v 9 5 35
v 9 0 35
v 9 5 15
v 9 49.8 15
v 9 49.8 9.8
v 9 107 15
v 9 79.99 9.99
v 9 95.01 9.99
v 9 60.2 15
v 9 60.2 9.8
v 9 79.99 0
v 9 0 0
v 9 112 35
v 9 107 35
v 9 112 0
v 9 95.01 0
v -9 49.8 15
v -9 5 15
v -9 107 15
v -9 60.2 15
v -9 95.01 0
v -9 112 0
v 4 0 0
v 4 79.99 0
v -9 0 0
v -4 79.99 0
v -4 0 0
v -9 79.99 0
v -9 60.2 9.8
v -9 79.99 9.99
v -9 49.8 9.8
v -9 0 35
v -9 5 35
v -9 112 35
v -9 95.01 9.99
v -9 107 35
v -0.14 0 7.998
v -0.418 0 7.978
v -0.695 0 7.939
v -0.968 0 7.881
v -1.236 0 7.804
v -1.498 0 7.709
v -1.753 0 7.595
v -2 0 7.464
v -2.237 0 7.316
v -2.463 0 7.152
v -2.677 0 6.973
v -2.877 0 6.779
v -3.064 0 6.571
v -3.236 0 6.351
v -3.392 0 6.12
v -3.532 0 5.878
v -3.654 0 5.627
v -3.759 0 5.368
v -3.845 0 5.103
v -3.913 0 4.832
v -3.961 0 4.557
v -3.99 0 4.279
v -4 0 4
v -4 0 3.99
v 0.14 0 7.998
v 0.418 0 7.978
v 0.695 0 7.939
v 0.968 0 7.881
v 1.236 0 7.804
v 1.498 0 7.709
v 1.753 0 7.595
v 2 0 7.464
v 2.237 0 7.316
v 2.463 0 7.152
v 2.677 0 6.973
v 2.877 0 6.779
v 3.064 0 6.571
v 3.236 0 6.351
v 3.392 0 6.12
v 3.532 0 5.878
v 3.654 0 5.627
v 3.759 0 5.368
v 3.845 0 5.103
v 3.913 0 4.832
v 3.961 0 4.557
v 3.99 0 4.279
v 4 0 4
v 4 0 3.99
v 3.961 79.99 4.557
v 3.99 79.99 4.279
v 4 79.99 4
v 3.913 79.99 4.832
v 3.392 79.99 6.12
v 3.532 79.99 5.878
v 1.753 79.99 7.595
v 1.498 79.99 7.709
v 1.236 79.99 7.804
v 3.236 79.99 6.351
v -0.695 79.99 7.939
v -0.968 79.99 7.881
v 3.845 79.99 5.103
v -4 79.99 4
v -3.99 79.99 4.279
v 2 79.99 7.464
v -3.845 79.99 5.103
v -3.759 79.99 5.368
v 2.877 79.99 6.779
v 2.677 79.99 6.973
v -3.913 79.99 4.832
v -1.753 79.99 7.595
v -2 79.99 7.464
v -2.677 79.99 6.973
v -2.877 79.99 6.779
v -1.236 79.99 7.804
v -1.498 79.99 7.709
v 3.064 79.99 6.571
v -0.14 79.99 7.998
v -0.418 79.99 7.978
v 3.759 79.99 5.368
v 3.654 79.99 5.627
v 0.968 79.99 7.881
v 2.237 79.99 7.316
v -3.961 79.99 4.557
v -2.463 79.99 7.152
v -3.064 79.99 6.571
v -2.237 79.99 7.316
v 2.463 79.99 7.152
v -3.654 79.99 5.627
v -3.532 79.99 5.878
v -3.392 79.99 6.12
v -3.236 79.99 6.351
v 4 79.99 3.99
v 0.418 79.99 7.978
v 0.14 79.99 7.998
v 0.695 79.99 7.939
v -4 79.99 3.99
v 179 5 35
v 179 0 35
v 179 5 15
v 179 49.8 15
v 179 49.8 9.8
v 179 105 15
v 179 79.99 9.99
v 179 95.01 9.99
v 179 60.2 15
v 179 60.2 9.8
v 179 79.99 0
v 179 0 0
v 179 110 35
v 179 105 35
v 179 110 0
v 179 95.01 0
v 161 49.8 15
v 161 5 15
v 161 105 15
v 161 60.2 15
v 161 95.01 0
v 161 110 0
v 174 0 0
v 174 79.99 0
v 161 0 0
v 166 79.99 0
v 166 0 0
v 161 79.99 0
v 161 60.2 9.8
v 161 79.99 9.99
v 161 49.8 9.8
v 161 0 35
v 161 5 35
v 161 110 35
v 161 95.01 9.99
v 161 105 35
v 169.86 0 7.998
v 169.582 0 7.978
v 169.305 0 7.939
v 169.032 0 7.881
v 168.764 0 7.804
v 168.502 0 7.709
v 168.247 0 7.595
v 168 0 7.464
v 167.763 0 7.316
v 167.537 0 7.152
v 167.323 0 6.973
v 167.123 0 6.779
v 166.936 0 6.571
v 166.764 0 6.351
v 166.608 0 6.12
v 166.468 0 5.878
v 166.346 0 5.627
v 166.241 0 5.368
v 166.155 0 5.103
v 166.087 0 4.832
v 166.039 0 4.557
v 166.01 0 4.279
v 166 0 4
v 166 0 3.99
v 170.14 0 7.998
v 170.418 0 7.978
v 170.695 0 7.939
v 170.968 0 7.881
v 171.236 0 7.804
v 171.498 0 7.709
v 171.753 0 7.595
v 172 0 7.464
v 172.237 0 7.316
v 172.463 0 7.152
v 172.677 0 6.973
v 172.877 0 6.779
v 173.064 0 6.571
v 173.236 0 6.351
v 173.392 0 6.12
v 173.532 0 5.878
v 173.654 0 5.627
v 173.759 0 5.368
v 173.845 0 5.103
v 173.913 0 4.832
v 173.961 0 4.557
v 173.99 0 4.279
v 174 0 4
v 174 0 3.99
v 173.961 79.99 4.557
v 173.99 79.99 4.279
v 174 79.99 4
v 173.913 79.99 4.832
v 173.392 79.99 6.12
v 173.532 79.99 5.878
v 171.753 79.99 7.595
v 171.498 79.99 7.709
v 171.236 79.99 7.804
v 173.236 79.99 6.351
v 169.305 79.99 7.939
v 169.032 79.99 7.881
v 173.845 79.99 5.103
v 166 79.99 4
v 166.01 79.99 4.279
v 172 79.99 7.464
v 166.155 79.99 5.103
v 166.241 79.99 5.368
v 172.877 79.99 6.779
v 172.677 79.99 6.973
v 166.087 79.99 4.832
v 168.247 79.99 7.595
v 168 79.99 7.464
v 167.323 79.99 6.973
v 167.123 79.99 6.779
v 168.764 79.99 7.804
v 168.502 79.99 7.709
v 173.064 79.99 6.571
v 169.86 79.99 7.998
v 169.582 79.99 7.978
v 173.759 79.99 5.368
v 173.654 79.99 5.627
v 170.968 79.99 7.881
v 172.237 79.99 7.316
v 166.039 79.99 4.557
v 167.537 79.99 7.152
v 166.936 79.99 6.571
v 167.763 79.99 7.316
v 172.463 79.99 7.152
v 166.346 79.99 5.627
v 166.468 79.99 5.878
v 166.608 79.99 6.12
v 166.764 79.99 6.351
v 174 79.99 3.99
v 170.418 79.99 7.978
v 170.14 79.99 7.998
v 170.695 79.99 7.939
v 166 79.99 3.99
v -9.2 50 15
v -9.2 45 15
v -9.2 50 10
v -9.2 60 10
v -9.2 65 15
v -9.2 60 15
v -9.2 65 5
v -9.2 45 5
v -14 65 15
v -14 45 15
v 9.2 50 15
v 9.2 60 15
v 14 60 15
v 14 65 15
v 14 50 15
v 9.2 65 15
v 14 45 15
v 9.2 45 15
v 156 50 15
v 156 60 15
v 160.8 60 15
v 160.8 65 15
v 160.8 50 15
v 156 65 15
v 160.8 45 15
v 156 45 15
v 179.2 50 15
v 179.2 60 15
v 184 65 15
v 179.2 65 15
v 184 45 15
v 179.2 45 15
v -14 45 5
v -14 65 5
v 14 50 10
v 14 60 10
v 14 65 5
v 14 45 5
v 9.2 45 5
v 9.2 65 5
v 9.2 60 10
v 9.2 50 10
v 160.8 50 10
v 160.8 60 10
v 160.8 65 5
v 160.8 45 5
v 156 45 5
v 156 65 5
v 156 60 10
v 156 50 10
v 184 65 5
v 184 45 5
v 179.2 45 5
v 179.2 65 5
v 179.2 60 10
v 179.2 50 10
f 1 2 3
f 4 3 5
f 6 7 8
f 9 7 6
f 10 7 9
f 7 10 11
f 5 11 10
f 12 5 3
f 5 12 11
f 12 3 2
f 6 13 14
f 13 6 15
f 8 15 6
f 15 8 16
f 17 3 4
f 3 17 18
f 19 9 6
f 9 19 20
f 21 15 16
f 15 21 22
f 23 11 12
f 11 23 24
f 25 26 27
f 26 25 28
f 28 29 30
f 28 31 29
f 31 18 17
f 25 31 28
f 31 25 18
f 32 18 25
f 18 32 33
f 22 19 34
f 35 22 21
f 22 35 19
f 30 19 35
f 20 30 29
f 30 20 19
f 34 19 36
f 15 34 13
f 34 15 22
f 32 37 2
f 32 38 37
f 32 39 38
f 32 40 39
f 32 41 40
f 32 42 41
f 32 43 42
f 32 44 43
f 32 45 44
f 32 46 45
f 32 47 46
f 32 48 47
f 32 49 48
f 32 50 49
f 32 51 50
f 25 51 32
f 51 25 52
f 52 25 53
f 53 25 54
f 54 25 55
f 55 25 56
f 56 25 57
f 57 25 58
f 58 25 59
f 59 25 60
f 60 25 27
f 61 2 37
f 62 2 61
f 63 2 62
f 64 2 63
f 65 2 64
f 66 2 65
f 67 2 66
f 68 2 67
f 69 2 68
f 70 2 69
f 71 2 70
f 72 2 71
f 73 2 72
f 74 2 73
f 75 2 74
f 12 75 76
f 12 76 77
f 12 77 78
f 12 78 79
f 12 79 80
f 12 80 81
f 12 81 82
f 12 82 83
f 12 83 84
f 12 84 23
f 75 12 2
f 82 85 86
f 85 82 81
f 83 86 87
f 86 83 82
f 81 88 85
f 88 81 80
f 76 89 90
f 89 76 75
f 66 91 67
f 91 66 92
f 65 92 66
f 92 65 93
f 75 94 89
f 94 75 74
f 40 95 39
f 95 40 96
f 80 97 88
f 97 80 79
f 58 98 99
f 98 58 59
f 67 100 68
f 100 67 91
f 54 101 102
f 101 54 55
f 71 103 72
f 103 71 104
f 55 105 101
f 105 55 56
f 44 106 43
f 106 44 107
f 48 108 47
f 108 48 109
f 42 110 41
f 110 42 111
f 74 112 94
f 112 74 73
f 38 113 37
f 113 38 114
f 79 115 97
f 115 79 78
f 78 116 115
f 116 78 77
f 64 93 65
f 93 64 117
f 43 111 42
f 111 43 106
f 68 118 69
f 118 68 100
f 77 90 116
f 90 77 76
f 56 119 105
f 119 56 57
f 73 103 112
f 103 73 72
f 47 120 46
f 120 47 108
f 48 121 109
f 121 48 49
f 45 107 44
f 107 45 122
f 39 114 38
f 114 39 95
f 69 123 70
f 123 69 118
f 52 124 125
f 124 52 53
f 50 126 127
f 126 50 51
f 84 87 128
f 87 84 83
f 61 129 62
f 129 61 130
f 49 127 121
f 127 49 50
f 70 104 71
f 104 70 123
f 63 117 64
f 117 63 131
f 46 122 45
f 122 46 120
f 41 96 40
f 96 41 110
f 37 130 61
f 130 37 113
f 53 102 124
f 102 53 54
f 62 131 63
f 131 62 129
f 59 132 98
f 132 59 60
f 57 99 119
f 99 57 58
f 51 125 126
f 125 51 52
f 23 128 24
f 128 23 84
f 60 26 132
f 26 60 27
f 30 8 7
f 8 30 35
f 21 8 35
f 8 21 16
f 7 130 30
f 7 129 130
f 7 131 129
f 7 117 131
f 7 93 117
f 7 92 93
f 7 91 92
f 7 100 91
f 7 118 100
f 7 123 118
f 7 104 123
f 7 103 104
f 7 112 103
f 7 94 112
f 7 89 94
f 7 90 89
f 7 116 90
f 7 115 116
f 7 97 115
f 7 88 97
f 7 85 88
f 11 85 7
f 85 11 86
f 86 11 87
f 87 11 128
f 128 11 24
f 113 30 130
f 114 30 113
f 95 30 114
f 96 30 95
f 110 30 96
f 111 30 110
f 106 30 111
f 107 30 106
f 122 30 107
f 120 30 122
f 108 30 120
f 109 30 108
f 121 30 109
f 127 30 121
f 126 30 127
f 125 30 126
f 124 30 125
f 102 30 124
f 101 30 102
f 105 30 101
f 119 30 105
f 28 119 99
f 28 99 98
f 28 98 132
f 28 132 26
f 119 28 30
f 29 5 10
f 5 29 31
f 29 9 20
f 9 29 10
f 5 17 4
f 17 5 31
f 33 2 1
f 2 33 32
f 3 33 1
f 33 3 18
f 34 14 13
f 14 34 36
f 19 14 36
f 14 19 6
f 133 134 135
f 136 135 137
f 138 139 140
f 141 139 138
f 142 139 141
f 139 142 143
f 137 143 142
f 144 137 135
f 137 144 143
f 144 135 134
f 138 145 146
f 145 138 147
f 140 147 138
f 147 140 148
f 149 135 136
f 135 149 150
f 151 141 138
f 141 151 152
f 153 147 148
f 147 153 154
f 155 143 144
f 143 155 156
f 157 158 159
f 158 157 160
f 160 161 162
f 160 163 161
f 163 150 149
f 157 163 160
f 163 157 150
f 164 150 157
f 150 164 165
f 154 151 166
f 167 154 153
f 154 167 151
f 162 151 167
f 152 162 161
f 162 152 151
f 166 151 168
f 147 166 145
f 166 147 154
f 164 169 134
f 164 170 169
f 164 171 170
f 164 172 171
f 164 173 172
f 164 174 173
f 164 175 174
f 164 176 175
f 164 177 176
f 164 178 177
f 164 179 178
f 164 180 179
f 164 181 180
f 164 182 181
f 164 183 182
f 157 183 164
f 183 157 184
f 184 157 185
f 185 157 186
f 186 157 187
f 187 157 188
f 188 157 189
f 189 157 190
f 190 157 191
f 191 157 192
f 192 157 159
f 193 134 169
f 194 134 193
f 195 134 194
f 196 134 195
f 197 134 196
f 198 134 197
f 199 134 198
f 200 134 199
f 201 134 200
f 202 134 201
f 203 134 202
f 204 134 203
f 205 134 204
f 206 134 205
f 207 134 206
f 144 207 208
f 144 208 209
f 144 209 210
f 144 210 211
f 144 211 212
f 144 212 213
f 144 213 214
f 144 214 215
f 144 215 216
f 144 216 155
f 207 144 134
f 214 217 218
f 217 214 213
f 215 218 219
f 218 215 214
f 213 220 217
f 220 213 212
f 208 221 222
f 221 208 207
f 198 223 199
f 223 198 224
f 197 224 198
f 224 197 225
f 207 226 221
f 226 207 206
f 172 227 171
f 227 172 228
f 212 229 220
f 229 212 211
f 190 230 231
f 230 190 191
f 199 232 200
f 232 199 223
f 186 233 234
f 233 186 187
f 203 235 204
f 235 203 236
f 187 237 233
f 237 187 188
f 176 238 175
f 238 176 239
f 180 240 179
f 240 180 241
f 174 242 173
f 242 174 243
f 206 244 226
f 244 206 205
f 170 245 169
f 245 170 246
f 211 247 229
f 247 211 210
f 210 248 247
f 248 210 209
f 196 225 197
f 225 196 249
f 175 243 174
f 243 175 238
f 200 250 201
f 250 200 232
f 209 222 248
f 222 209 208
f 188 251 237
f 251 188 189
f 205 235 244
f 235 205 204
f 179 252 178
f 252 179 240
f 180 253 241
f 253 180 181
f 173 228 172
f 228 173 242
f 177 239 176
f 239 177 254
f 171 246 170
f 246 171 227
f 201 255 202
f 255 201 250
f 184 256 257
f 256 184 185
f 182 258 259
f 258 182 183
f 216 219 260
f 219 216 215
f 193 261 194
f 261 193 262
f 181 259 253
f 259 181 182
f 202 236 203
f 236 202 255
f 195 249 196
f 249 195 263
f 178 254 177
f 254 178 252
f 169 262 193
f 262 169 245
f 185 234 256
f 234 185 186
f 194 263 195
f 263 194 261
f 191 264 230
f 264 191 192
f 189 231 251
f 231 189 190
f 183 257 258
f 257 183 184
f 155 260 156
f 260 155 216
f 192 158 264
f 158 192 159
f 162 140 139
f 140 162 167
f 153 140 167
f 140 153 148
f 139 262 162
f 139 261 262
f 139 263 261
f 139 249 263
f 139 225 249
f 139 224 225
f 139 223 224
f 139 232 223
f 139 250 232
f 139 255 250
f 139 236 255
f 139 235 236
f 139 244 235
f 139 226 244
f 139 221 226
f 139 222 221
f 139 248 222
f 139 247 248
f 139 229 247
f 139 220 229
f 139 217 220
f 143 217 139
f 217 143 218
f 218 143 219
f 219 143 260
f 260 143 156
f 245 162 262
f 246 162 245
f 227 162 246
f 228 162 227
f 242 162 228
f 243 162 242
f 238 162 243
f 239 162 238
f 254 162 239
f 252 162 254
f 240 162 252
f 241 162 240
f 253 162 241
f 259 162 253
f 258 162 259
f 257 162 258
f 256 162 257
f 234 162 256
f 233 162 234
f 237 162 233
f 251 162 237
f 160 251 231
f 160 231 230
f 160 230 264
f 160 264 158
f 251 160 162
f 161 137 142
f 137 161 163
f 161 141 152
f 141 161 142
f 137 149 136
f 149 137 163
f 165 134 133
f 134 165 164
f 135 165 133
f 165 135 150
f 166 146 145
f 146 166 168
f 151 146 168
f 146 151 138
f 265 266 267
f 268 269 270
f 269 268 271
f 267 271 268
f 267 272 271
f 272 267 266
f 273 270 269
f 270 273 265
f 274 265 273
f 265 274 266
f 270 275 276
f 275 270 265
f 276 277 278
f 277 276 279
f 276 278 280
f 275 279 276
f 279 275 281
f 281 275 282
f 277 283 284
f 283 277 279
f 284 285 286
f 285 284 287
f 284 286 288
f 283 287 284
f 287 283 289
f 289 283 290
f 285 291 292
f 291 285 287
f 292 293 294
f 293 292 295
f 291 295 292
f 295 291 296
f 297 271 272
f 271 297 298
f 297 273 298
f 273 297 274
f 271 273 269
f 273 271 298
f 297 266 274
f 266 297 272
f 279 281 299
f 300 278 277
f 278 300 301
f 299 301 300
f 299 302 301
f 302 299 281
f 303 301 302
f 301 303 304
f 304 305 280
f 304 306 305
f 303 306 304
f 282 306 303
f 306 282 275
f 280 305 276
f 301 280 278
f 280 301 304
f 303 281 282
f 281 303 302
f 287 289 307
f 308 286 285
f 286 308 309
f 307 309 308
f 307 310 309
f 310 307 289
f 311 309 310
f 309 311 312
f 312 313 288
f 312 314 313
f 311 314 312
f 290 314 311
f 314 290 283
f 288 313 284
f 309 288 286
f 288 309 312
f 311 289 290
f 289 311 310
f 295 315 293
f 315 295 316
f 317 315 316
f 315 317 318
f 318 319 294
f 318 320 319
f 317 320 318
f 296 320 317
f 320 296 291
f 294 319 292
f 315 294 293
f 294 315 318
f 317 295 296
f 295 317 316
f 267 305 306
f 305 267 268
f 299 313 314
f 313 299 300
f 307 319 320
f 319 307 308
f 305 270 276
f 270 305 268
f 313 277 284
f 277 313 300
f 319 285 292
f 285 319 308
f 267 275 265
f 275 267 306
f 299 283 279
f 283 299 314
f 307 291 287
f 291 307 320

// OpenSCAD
eps = 0.01;
$fn = 90;
tol = 0.2;

// branches
wt = 5;
// carriage diametee
c_d = 8;
c_y = 80;
c_yo = 20;
c_yoo = 2;
c_h = 20;
c_zo = 2;
c_l = 170;

module carriage_hook(off)
{
    _a = c_d+2*wt;
    _b = c_y+c_yo+2*wt+off;
    _c = c_d+c_zo+wt;
    
    difference()
    {
        
        translate([-_a/2,0,0])
            cube([_a,_b,_c]);
        // carriage lock
        translate([0,c_y,c_d/2])
            rotate([90,0,0])
                cylinder(h=c_y+2*eps,d=c_d);
        // carriage border for better grip
        translate([-c_d/2,-eps,-eps])
            cube([c_d,c_y+2*eps,c_d/2]);
        // carriage end cutoff
        translate([-c_d/2-wt-eps, c_y-eps, -eps])
            cube([c_d+2*wt+2*eps, c_yo+2*eps-wt, c_d+c_zo]);
        // 
        //translate([-c_d/2-wt-eps, c_y-eps, -eps])
        //    cube([c_d+2*wt+2*eps, c_yo+2*eps-wt, c_d+c_zo]);
        
        // hook connector
        translate([-c_d/2-wt-eps,(c_y+c_yo)/2-tol,_c-wt-tol])
            cube([c_d+2*wt+2*eps,2*wt+2*tol,wt+tol+eps]);
    }
    
    // front border
    translate([-c_d/2-wt,0,c_d+wt+c_zo])
        cube([c_d+2*wt,wt,c_h]);
    // back border
    translate([-c_d/2-wt,_b-wt,c_d+wt+c_zo])
        cube([c_d+2*wt,wt,c_h]);
}

module left_hook()
{
    carriage_hook(2);
}

module right_hook()
{
    carriage_hook(0);
}



module power_source_travel_holder()
{
    left_hook();
    
    translate([c_l,0,0])
        right_hook();
    
    // connector
    _l = 4*wt + c_d + c_l;
    translate([-2*wt-c_d/2,(c_y+c_yo)/2,c_d+c_zo])
        union()
        {
            // main part
            cube([_l,2*wt,wt]);
            
            translate([0,-wt,-wt])
            {
                // left borders
                cube([wt-tol,4*wt,2*wt]);
                translate([3*wt+c_d+tol,0,0])
                    cube([wt-tol,4*wt,2*wt]);
                
                // right borders
                translate([c_l,0,0])
                    cube([wt-tol,4*wt,2*wt]);
                translate([3*wt+c_d+tol+c_l,0,0])
                    cube([wt-tol,4*wt,2*wt]);
            }
            
        }
        
}

power_source_travel_holder();
